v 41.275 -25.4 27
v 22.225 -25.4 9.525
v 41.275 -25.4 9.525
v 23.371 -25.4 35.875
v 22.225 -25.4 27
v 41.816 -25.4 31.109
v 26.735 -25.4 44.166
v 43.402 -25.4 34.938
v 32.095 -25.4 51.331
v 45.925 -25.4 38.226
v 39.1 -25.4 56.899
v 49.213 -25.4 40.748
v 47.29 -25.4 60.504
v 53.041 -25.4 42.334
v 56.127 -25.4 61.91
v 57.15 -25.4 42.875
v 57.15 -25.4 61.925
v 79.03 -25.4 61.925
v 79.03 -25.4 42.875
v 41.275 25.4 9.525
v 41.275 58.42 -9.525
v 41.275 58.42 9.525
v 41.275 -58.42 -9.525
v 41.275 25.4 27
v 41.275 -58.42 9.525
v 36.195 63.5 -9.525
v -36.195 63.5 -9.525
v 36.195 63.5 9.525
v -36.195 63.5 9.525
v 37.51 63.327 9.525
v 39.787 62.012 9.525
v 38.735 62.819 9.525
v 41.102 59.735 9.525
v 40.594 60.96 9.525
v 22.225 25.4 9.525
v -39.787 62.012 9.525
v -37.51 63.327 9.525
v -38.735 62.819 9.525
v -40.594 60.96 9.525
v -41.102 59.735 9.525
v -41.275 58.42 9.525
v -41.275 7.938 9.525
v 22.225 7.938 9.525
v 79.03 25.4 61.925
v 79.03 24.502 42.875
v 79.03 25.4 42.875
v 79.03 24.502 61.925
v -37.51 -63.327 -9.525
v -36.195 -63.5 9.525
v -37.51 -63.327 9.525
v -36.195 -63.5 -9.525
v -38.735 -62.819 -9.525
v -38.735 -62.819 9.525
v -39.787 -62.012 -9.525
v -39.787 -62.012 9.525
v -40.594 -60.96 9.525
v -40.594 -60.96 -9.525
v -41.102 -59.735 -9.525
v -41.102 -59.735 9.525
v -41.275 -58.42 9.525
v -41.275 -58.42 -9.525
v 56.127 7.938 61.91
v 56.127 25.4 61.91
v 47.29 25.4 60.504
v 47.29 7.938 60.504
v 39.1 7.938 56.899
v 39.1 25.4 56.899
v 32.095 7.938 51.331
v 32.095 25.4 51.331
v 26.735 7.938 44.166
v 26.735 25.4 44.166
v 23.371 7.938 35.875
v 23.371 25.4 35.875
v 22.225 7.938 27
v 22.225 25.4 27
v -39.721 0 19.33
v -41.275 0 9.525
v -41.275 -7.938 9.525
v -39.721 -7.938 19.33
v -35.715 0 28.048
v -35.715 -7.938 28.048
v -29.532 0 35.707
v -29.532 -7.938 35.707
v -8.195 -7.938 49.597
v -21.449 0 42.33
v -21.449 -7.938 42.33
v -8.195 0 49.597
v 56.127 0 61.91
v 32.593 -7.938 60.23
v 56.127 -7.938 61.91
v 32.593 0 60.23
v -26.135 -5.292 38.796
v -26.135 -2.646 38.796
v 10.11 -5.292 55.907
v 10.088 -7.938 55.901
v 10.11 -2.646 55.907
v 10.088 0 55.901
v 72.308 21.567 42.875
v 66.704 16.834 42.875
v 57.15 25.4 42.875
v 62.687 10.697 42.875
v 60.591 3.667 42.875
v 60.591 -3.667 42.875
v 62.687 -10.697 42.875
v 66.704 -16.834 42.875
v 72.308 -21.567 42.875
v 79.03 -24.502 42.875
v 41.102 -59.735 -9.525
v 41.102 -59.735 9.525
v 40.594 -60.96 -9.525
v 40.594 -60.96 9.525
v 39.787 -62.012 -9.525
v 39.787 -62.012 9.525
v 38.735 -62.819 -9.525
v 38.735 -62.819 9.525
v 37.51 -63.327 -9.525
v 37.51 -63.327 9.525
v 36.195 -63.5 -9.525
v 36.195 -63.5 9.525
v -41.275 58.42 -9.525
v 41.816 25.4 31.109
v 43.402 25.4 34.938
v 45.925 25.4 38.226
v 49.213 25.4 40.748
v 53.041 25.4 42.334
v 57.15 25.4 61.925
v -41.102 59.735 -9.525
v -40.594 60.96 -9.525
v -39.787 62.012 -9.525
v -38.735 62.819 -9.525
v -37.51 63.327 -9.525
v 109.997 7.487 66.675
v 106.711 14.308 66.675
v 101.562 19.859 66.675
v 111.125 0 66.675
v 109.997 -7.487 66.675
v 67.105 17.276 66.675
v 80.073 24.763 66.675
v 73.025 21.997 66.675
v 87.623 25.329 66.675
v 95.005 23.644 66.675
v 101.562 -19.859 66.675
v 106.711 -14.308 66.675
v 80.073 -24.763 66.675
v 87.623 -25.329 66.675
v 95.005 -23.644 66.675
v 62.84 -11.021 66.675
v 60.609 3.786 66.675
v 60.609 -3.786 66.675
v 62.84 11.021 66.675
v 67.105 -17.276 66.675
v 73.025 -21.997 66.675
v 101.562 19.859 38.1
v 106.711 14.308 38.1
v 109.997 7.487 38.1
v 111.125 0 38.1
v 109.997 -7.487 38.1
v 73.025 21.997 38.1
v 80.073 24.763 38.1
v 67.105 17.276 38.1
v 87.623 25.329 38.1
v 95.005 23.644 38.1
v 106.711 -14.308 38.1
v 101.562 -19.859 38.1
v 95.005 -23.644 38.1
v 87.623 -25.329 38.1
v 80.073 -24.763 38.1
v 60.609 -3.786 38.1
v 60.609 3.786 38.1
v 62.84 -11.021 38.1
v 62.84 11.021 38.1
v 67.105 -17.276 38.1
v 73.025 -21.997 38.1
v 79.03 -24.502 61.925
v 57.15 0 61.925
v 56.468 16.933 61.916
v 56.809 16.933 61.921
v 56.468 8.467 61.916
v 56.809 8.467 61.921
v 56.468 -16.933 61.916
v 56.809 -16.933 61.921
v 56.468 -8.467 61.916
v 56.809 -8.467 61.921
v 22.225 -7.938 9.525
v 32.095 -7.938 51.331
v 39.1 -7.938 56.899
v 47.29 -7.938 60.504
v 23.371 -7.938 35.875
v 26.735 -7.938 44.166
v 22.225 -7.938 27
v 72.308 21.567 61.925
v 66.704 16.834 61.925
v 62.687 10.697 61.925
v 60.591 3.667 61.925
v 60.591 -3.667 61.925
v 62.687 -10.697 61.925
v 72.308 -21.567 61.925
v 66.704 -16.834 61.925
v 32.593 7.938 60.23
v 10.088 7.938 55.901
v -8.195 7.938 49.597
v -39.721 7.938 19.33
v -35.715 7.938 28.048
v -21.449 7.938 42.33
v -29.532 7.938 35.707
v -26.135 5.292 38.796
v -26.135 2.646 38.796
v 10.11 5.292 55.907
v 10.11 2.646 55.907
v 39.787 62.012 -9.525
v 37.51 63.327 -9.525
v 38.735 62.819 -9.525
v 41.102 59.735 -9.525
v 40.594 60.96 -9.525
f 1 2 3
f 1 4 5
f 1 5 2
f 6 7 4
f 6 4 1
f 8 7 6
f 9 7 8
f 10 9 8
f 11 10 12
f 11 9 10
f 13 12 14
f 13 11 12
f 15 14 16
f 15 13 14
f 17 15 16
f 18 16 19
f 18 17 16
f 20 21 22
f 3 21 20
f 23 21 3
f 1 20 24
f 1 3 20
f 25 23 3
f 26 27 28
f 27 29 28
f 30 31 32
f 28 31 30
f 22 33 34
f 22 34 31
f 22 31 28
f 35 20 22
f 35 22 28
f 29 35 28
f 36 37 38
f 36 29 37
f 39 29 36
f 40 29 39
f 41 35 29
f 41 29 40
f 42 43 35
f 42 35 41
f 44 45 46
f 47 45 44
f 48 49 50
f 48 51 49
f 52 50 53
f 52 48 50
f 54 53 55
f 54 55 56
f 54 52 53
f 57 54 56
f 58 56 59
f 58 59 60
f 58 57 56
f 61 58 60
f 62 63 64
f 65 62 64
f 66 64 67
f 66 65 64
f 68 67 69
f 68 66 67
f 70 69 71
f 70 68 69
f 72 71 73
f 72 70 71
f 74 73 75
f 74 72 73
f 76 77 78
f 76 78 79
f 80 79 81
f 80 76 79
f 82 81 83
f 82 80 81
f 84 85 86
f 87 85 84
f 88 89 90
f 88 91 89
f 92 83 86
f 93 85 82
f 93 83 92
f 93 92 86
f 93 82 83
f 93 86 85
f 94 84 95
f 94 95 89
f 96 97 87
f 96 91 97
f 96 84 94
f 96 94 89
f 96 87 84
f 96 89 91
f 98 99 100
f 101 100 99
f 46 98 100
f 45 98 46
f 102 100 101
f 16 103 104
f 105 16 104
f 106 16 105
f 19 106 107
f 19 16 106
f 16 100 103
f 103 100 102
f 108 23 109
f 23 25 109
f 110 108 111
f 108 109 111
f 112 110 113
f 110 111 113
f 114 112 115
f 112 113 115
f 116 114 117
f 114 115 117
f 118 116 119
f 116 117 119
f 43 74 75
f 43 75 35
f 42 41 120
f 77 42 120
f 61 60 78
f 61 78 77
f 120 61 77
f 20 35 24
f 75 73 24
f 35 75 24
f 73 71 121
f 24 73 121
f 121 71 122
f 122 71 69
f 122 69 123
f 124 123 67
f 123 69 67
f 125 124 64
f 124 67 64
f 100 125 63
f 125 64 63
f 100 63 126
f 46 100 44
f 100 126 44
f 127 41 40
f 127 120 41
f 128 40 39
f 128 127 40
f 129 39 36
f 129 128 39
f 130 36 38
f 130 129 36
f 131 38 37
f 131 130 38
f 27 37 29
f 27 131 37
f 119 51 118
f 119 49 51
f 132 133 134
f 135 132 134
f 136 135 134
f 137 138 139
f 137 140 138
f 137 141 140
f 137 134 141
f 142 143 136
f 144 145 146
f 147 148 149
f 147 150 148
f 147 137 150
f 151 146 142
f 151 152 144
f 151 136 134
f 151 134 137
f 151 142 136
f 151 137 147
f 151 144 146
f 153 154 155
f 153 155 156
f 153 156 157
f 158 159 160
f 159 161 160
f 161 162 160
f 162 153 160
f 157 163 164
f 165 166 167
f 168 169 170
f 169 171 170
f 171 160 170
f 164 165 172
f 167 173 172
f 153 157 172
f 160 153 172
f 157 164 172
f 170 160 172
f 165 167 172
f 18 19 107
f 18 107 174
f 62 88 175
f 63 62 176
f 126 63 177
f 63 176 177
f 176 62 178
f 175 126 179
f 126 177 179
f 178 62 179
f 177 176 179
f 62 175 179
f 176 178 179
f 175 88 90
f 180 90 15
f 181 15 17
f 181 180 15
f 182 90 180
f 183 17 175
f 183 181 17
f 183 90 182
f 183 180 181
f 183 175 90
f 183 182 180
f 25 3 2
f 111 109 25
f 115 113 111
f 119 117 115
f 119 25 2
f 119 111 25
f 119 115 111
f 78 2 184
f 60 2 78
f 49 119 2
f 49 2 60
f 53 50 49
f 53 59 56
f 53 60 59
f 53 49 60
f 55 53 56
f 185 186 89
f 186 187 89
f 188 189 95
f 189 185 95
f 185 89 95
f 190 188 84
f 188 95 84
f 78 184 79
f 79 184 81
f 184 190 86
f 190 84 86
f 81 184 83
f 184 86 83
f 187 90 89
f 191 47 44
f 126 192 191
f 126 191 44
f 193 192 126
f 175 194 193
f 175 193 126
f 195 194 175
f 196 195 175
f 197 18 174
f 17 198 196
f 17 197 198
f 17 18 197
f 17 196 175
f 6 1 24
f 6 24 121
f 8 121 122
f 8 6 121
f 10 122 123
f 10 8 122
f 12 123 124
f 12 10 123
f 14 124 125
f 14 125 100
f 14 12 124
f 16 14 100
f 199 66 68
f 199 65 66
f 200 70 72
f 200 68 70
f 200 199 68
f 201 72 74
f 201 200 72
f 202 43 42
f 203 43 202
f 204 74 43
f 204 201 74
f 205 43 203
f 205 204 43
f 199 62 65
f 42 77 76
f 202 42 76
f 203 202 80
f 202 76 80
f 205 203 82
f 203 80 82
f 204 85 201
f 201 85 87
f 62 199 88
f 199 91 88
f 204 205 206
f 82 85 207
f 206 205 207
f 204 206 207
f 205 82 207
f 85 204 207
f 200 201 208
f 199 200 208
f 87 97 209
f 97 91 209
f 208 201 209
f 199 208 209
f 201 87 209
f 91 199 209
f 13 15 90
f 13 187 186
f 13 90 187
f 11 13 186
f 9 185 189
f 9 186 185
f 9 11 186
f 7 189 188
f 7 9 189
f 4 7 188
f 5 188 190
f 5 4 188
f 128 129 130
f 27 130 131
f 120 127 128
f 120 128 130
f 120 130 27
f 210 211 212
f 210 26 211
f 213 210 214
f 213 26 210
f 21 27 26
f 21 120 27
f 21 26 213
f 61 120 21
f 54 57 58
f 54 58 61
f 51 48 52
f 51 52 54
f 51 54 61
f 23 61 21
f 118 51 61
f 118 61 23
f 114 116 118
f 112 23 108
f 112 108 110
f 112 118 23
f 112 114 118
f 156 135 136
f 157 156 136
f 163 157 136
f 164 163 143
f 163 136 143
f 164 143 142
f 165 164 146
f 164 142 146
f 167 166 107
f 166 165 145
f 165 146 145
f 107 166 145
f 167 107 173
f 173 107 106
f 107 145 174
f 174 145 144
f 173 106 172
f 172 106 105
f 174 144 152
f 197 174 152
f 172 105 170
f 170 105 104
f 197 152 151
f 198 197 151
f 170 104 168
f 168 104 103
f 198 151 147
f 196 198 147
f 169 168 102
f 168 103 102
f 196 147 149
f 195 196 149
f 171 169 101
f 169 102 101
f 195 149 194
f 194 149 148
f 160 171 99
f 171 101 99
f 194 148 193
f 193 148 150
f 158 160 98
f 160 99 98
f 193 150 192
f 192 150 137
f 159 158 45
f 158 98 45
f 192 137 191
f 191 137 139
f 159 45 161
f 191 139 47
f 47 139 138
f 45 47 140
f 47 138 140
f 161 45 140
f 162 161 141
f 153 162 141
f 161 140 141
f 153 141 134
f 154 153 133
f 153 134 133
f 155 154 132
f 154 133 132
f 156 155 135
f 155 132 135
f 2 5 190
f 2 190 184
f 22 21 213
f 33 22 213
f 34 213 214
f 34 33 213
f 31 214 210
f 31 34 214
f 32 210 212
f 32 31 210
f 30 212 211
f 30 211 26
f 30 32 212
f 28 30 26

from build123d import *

# Parameters (mm, degrees)
F1_DEPTH = 63.5
F0_W     = 18.70497
F0_H     = 19.05
F2_DEPTH = 25.4
F3_DEPTH = 7.9375
F0_W_2   = 25.4
F0_H_2   = 28.575
F5_R     = 5.08


with BuildPart() as f1:
    # F0 (on Front) → F1 (new body, symmetric)
    with BuildSketch(Plane.XZ):
        Polygon((-41.275, 9.525), (-41.275, -9.525), (41.275, -9.525), (41.275, 9.525), (22.225, 9.525), align=None)
    extrude(amount=F1_DEPTH, both=True)

    # F0 (on Front) → F2 (join, symmetric)
    with BuildSketch(Plane.XZ):
        with BuildLine():
            Line((22.225, 9.525), (41.275, 9.525))
            Line((41.275, 9.525), (41.275, 27.0002))
            ThreePointArc((41.275, 27.0002), (45.92468, 38.22552), (57.15, 42.8752))
            Line((57.15, 42.8752), (60.325, 42.8752))
            Line((60.325, 42.8752), (60.325, 61.9252))
            Line((60.325, 61.9252), (57.15, 61.9252))
            add(Edge.make_bspline(
                [(56.126842, 61.91021), (56.468024, 61.915997), (56.809083, 61.920993), (57.15, 61.9252)],
                knots=[110.703053, 110.703053, 110.703053, 110.703053, 111.504536, 111.504536, 111.504536, 111.504536], degree=3))
            ThreePointArc((56.126842, 61.91021), (32.095166, 51.331475), (22.225, 27.0002))
            Line((22.225, 27.0002), (22.225, 9.525))
        make_face()
        with Locations((69.677485, 52.4002)):
            Rectangle(F0_W, F0_H)
    extrude(amount=F2_DEPTH, both=True)

    # F0 (on Front) → F3 (join, symmetric)
    with BuildSketch(Plane.XZ):
        with BuildLine():
            add(Edge.make_bspline(
                [(-41.275, 9.525), (-40.465312, 45.22587), (9.001882, 61.110903), (56.126842, 61.91021)],
                knots=[0, 0, 0, 0, 110.703053, 110.703053, 110.703053, 110.703053], degree=3))
            Line((-41.275, 9.525), (22.225, 9.525))
            Line((22.225, 9.525), (22.225, 27.0002))
            ThreePointArc((22.225, 27.0002), (32.095166, 51.331475), (56.126842, 61.91021))
        make_face()
    extrude(amount=F3_DEPTH, both=True)

    # F0 (on Front) → F4 (revolve)
    with BuildSketch(Plane.XZ):
        with Locations((98.425, 52.3875)):
            Rectangle(F0_W_2, F0_H_2)
    revolve(axis=Axis((85.725, 0, 52.3875), (0, 0, -1)))

    # F5
    f5_edges = [f1.edges().sort_by_distance(p)[0] for p in [
        (41.275, -63.5, 0),
        (-41.275, -63.5, 0),
        (41.275, 63.5, 0),
        (-41.275, 63.5, 0),
    ]]
    fillet(f5_edges, radius=F5_R)


solid = f1.part
